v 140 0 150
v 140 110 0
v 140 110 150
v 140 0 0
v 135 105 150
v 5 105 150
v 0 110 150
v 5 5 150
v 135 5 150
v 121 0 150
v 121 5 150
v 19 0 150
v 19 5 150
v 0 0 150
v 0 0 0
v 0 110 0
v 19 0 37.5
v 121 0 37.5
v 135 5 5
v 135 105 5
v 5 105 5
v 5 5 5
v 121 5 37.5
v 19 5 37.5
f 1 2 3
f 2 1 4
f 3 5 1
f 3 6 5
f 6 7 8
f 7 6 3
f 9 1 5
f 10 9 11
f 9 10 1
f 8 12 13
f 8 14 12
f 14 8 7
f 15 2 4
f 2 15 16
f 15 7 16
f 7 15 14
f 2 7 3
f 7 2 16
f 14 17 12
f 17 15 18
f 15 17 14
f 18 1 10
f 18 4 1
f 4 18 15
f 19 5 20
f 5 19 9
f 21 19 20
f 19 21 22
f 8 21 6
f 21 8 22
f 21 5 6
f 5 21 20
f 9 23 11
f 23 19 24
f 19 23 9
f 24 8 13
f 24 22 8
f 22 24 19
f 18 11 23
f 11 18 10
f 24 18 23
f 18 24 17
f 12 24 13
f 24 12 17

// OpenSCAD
/* [General Settings] */
NUMBER_OF_COMPARTMENTS = 1;
STACK_COMPARTMENTS = true;
SUPPORT_WALLS_FOR_STACK_COMPARTMENTS = true;
TRIANGLE_SLANTS_FOR_STACK_COMPARTMENTS = true;

/* [Compartment Dimensions] */
WALL_THICKNESS = 5; // .1
// Includes Walls
COMPARTMENT_WIDTH = 140; // .1
// Includes Walls
COMPARTMENT_DEPTH = 110; // .1
// Includes Walls
COMPARTMENT_HEIGHT = 150; // .1

/* [Hidden] */
COMPARTMENTS_PER_ROW = (STACK_COMPARTMENTS) ? NUMBER_OF_COMPARTMENTS / 2 : NUMBER_OF_COMPARTMENTS;

render() {
  for (i = [0:1:round(COMPARTMENTS_PER_ROW) - 1]) {
    // Move everything over next to each other for each compartment block
    translate(v=[(i * COMPARTMENT_WIDTH) - (i * WALL_THICKNESS), 0, 0]) {
      compartment();

      // If its supposed to stack compartments, and if the amount of total compartments is either even, or if its any compartment except for the last one
      // Effectively makes sure that the right amount of compartments is used, even if its an uneven amount, leaving out the last top one if needed
      if (STACK_COMPARTMENTS && (NUMBER_OF_COMPARTMENTS % 2 == 0 || i != round(COMPARTMENTS_PER_ROW) - 1)) {
        // Move everything back while avoiding double walls
        translate(v=[0, COMPARTMENT_DEPTH - WALL_THICKNESS, 0]) {
          // Make the upper compartment, reuse part of the first ones wall for
          // lower height overall
          translate(v=[0, 0, 0.75 * COMPARTMENT_HEIGHT]) { compartment(); }

          // Support Walls below the top compartment
          if (SUPPORT_WALLS_FOR_STACK_COMPARTMENTS) {
            for (x = [0.25:0.50:0.75]) {
              translate(v=[x * (COMPARTMENT_WIDTH - WALL_THICKNESS), 0, 0]) {
                cube(size=[WALL_THICKNESS, COMPARTMENT_DEPTH, 0.75 * COMPARTMENT_HEIGHT]);
              }
            }
          }

          // Slants to prevent overhang issues while printing
          if (TRIANGLE_SLANTS_FOR_STACK_COMPARTMENTS) {
            // Do 2 times, orient on Support Walls in the back
            for (x = [0.25:0.50:0.75]) {
              hull() {
                // Lower Sticks in the Walls
                translate(
                  v=[
                    x * (COMPARTMENT_WIDTH - WALL_THICKNESS),
                    0,
                    (0.75 * COMPARTMENT_HEIGHT) - (0.25 * COMPARTMENT_WIDTH),
                  ]
                ) {
                  cube(size=[WALL_THICKNESS, COMPARTMENT_DEPTH, WALL_THICKNESS]);
                }

                // Upper Sticks in the Ceiling
                for (x2 = [-1:1:1]) {
                  // Move aligned to the supported walls (x) and make 3 sticks, each moved by as much as the walls, so they align with start, end and the middle. Also move up into the ceiling (0.75 * COMPARTMENT_HEIGHT)
                  translate(
                    v=[
                      (x * (COMPARTMENT_WIDTH - WALL_THICKNESS)) + (x2 * (0.25 * (COMPARTMENT_WIDTH - WALL_THICKNESS))),
                      0,
                      0.75 * COMPARTMENT_HEIGHT,
                    ]
                  ) {
                    cube(size=[WALL_THICKNESS, COMPARTMENT_DEPTH, WALL_THICKNESS]);
                  }
                }
              }
            }
          }
        }
      }
    }
  }
}

module compartment() {
  difference() {
    difference() {
      // Main Block
      cube(size=[COMPARTMENT_WIDTH, COMPARTMENT_DEPTH, COMPARTMENT_HEIGHT]);

      translate(v=[WALL_THICKNESS, WALL_THICKNESS, WALL_THICKNESS]) {
        cube(
          // Leave floor, side wall, and back front wall in peace
          size=[
            COMPARTMENT_WIDTH - (2 * WALL_THICKNESS), // 1 * for overhang from moving, 1 * for leaving the opposite wall intact
            COMPARTMENT_DEPTH - (2 * WALL_THICKNESS), // same here
            COMPARTMENT_HEIGHT - WALL_THICKNESS, // Only 1 * so that there is no ceiling
          ]
        );
      }
    }

    translate(v=[WALL_THICKNESS + (0.1 * COMPARTMENT_WIDTH), 0, (0.25 * COMPARTMENT_HEIGHT)]) {
      cube(
        // Cutout of the fron wall for easy reading and access to packs
        size=[
          COMPARTMENT_WIDTH - ( (2 * WALL_THICKNESS) + (0.2 * COMPARTMENT_WIDTH)), // Leave 10% of the width left on each side, so the packs dont fall out
          WALL_THICKNESS,
          COMPARTMENT_HEIGHT - (0.25 * COMPARTMENT_HEIGHT),
        ]
      );
    }
  }
}
